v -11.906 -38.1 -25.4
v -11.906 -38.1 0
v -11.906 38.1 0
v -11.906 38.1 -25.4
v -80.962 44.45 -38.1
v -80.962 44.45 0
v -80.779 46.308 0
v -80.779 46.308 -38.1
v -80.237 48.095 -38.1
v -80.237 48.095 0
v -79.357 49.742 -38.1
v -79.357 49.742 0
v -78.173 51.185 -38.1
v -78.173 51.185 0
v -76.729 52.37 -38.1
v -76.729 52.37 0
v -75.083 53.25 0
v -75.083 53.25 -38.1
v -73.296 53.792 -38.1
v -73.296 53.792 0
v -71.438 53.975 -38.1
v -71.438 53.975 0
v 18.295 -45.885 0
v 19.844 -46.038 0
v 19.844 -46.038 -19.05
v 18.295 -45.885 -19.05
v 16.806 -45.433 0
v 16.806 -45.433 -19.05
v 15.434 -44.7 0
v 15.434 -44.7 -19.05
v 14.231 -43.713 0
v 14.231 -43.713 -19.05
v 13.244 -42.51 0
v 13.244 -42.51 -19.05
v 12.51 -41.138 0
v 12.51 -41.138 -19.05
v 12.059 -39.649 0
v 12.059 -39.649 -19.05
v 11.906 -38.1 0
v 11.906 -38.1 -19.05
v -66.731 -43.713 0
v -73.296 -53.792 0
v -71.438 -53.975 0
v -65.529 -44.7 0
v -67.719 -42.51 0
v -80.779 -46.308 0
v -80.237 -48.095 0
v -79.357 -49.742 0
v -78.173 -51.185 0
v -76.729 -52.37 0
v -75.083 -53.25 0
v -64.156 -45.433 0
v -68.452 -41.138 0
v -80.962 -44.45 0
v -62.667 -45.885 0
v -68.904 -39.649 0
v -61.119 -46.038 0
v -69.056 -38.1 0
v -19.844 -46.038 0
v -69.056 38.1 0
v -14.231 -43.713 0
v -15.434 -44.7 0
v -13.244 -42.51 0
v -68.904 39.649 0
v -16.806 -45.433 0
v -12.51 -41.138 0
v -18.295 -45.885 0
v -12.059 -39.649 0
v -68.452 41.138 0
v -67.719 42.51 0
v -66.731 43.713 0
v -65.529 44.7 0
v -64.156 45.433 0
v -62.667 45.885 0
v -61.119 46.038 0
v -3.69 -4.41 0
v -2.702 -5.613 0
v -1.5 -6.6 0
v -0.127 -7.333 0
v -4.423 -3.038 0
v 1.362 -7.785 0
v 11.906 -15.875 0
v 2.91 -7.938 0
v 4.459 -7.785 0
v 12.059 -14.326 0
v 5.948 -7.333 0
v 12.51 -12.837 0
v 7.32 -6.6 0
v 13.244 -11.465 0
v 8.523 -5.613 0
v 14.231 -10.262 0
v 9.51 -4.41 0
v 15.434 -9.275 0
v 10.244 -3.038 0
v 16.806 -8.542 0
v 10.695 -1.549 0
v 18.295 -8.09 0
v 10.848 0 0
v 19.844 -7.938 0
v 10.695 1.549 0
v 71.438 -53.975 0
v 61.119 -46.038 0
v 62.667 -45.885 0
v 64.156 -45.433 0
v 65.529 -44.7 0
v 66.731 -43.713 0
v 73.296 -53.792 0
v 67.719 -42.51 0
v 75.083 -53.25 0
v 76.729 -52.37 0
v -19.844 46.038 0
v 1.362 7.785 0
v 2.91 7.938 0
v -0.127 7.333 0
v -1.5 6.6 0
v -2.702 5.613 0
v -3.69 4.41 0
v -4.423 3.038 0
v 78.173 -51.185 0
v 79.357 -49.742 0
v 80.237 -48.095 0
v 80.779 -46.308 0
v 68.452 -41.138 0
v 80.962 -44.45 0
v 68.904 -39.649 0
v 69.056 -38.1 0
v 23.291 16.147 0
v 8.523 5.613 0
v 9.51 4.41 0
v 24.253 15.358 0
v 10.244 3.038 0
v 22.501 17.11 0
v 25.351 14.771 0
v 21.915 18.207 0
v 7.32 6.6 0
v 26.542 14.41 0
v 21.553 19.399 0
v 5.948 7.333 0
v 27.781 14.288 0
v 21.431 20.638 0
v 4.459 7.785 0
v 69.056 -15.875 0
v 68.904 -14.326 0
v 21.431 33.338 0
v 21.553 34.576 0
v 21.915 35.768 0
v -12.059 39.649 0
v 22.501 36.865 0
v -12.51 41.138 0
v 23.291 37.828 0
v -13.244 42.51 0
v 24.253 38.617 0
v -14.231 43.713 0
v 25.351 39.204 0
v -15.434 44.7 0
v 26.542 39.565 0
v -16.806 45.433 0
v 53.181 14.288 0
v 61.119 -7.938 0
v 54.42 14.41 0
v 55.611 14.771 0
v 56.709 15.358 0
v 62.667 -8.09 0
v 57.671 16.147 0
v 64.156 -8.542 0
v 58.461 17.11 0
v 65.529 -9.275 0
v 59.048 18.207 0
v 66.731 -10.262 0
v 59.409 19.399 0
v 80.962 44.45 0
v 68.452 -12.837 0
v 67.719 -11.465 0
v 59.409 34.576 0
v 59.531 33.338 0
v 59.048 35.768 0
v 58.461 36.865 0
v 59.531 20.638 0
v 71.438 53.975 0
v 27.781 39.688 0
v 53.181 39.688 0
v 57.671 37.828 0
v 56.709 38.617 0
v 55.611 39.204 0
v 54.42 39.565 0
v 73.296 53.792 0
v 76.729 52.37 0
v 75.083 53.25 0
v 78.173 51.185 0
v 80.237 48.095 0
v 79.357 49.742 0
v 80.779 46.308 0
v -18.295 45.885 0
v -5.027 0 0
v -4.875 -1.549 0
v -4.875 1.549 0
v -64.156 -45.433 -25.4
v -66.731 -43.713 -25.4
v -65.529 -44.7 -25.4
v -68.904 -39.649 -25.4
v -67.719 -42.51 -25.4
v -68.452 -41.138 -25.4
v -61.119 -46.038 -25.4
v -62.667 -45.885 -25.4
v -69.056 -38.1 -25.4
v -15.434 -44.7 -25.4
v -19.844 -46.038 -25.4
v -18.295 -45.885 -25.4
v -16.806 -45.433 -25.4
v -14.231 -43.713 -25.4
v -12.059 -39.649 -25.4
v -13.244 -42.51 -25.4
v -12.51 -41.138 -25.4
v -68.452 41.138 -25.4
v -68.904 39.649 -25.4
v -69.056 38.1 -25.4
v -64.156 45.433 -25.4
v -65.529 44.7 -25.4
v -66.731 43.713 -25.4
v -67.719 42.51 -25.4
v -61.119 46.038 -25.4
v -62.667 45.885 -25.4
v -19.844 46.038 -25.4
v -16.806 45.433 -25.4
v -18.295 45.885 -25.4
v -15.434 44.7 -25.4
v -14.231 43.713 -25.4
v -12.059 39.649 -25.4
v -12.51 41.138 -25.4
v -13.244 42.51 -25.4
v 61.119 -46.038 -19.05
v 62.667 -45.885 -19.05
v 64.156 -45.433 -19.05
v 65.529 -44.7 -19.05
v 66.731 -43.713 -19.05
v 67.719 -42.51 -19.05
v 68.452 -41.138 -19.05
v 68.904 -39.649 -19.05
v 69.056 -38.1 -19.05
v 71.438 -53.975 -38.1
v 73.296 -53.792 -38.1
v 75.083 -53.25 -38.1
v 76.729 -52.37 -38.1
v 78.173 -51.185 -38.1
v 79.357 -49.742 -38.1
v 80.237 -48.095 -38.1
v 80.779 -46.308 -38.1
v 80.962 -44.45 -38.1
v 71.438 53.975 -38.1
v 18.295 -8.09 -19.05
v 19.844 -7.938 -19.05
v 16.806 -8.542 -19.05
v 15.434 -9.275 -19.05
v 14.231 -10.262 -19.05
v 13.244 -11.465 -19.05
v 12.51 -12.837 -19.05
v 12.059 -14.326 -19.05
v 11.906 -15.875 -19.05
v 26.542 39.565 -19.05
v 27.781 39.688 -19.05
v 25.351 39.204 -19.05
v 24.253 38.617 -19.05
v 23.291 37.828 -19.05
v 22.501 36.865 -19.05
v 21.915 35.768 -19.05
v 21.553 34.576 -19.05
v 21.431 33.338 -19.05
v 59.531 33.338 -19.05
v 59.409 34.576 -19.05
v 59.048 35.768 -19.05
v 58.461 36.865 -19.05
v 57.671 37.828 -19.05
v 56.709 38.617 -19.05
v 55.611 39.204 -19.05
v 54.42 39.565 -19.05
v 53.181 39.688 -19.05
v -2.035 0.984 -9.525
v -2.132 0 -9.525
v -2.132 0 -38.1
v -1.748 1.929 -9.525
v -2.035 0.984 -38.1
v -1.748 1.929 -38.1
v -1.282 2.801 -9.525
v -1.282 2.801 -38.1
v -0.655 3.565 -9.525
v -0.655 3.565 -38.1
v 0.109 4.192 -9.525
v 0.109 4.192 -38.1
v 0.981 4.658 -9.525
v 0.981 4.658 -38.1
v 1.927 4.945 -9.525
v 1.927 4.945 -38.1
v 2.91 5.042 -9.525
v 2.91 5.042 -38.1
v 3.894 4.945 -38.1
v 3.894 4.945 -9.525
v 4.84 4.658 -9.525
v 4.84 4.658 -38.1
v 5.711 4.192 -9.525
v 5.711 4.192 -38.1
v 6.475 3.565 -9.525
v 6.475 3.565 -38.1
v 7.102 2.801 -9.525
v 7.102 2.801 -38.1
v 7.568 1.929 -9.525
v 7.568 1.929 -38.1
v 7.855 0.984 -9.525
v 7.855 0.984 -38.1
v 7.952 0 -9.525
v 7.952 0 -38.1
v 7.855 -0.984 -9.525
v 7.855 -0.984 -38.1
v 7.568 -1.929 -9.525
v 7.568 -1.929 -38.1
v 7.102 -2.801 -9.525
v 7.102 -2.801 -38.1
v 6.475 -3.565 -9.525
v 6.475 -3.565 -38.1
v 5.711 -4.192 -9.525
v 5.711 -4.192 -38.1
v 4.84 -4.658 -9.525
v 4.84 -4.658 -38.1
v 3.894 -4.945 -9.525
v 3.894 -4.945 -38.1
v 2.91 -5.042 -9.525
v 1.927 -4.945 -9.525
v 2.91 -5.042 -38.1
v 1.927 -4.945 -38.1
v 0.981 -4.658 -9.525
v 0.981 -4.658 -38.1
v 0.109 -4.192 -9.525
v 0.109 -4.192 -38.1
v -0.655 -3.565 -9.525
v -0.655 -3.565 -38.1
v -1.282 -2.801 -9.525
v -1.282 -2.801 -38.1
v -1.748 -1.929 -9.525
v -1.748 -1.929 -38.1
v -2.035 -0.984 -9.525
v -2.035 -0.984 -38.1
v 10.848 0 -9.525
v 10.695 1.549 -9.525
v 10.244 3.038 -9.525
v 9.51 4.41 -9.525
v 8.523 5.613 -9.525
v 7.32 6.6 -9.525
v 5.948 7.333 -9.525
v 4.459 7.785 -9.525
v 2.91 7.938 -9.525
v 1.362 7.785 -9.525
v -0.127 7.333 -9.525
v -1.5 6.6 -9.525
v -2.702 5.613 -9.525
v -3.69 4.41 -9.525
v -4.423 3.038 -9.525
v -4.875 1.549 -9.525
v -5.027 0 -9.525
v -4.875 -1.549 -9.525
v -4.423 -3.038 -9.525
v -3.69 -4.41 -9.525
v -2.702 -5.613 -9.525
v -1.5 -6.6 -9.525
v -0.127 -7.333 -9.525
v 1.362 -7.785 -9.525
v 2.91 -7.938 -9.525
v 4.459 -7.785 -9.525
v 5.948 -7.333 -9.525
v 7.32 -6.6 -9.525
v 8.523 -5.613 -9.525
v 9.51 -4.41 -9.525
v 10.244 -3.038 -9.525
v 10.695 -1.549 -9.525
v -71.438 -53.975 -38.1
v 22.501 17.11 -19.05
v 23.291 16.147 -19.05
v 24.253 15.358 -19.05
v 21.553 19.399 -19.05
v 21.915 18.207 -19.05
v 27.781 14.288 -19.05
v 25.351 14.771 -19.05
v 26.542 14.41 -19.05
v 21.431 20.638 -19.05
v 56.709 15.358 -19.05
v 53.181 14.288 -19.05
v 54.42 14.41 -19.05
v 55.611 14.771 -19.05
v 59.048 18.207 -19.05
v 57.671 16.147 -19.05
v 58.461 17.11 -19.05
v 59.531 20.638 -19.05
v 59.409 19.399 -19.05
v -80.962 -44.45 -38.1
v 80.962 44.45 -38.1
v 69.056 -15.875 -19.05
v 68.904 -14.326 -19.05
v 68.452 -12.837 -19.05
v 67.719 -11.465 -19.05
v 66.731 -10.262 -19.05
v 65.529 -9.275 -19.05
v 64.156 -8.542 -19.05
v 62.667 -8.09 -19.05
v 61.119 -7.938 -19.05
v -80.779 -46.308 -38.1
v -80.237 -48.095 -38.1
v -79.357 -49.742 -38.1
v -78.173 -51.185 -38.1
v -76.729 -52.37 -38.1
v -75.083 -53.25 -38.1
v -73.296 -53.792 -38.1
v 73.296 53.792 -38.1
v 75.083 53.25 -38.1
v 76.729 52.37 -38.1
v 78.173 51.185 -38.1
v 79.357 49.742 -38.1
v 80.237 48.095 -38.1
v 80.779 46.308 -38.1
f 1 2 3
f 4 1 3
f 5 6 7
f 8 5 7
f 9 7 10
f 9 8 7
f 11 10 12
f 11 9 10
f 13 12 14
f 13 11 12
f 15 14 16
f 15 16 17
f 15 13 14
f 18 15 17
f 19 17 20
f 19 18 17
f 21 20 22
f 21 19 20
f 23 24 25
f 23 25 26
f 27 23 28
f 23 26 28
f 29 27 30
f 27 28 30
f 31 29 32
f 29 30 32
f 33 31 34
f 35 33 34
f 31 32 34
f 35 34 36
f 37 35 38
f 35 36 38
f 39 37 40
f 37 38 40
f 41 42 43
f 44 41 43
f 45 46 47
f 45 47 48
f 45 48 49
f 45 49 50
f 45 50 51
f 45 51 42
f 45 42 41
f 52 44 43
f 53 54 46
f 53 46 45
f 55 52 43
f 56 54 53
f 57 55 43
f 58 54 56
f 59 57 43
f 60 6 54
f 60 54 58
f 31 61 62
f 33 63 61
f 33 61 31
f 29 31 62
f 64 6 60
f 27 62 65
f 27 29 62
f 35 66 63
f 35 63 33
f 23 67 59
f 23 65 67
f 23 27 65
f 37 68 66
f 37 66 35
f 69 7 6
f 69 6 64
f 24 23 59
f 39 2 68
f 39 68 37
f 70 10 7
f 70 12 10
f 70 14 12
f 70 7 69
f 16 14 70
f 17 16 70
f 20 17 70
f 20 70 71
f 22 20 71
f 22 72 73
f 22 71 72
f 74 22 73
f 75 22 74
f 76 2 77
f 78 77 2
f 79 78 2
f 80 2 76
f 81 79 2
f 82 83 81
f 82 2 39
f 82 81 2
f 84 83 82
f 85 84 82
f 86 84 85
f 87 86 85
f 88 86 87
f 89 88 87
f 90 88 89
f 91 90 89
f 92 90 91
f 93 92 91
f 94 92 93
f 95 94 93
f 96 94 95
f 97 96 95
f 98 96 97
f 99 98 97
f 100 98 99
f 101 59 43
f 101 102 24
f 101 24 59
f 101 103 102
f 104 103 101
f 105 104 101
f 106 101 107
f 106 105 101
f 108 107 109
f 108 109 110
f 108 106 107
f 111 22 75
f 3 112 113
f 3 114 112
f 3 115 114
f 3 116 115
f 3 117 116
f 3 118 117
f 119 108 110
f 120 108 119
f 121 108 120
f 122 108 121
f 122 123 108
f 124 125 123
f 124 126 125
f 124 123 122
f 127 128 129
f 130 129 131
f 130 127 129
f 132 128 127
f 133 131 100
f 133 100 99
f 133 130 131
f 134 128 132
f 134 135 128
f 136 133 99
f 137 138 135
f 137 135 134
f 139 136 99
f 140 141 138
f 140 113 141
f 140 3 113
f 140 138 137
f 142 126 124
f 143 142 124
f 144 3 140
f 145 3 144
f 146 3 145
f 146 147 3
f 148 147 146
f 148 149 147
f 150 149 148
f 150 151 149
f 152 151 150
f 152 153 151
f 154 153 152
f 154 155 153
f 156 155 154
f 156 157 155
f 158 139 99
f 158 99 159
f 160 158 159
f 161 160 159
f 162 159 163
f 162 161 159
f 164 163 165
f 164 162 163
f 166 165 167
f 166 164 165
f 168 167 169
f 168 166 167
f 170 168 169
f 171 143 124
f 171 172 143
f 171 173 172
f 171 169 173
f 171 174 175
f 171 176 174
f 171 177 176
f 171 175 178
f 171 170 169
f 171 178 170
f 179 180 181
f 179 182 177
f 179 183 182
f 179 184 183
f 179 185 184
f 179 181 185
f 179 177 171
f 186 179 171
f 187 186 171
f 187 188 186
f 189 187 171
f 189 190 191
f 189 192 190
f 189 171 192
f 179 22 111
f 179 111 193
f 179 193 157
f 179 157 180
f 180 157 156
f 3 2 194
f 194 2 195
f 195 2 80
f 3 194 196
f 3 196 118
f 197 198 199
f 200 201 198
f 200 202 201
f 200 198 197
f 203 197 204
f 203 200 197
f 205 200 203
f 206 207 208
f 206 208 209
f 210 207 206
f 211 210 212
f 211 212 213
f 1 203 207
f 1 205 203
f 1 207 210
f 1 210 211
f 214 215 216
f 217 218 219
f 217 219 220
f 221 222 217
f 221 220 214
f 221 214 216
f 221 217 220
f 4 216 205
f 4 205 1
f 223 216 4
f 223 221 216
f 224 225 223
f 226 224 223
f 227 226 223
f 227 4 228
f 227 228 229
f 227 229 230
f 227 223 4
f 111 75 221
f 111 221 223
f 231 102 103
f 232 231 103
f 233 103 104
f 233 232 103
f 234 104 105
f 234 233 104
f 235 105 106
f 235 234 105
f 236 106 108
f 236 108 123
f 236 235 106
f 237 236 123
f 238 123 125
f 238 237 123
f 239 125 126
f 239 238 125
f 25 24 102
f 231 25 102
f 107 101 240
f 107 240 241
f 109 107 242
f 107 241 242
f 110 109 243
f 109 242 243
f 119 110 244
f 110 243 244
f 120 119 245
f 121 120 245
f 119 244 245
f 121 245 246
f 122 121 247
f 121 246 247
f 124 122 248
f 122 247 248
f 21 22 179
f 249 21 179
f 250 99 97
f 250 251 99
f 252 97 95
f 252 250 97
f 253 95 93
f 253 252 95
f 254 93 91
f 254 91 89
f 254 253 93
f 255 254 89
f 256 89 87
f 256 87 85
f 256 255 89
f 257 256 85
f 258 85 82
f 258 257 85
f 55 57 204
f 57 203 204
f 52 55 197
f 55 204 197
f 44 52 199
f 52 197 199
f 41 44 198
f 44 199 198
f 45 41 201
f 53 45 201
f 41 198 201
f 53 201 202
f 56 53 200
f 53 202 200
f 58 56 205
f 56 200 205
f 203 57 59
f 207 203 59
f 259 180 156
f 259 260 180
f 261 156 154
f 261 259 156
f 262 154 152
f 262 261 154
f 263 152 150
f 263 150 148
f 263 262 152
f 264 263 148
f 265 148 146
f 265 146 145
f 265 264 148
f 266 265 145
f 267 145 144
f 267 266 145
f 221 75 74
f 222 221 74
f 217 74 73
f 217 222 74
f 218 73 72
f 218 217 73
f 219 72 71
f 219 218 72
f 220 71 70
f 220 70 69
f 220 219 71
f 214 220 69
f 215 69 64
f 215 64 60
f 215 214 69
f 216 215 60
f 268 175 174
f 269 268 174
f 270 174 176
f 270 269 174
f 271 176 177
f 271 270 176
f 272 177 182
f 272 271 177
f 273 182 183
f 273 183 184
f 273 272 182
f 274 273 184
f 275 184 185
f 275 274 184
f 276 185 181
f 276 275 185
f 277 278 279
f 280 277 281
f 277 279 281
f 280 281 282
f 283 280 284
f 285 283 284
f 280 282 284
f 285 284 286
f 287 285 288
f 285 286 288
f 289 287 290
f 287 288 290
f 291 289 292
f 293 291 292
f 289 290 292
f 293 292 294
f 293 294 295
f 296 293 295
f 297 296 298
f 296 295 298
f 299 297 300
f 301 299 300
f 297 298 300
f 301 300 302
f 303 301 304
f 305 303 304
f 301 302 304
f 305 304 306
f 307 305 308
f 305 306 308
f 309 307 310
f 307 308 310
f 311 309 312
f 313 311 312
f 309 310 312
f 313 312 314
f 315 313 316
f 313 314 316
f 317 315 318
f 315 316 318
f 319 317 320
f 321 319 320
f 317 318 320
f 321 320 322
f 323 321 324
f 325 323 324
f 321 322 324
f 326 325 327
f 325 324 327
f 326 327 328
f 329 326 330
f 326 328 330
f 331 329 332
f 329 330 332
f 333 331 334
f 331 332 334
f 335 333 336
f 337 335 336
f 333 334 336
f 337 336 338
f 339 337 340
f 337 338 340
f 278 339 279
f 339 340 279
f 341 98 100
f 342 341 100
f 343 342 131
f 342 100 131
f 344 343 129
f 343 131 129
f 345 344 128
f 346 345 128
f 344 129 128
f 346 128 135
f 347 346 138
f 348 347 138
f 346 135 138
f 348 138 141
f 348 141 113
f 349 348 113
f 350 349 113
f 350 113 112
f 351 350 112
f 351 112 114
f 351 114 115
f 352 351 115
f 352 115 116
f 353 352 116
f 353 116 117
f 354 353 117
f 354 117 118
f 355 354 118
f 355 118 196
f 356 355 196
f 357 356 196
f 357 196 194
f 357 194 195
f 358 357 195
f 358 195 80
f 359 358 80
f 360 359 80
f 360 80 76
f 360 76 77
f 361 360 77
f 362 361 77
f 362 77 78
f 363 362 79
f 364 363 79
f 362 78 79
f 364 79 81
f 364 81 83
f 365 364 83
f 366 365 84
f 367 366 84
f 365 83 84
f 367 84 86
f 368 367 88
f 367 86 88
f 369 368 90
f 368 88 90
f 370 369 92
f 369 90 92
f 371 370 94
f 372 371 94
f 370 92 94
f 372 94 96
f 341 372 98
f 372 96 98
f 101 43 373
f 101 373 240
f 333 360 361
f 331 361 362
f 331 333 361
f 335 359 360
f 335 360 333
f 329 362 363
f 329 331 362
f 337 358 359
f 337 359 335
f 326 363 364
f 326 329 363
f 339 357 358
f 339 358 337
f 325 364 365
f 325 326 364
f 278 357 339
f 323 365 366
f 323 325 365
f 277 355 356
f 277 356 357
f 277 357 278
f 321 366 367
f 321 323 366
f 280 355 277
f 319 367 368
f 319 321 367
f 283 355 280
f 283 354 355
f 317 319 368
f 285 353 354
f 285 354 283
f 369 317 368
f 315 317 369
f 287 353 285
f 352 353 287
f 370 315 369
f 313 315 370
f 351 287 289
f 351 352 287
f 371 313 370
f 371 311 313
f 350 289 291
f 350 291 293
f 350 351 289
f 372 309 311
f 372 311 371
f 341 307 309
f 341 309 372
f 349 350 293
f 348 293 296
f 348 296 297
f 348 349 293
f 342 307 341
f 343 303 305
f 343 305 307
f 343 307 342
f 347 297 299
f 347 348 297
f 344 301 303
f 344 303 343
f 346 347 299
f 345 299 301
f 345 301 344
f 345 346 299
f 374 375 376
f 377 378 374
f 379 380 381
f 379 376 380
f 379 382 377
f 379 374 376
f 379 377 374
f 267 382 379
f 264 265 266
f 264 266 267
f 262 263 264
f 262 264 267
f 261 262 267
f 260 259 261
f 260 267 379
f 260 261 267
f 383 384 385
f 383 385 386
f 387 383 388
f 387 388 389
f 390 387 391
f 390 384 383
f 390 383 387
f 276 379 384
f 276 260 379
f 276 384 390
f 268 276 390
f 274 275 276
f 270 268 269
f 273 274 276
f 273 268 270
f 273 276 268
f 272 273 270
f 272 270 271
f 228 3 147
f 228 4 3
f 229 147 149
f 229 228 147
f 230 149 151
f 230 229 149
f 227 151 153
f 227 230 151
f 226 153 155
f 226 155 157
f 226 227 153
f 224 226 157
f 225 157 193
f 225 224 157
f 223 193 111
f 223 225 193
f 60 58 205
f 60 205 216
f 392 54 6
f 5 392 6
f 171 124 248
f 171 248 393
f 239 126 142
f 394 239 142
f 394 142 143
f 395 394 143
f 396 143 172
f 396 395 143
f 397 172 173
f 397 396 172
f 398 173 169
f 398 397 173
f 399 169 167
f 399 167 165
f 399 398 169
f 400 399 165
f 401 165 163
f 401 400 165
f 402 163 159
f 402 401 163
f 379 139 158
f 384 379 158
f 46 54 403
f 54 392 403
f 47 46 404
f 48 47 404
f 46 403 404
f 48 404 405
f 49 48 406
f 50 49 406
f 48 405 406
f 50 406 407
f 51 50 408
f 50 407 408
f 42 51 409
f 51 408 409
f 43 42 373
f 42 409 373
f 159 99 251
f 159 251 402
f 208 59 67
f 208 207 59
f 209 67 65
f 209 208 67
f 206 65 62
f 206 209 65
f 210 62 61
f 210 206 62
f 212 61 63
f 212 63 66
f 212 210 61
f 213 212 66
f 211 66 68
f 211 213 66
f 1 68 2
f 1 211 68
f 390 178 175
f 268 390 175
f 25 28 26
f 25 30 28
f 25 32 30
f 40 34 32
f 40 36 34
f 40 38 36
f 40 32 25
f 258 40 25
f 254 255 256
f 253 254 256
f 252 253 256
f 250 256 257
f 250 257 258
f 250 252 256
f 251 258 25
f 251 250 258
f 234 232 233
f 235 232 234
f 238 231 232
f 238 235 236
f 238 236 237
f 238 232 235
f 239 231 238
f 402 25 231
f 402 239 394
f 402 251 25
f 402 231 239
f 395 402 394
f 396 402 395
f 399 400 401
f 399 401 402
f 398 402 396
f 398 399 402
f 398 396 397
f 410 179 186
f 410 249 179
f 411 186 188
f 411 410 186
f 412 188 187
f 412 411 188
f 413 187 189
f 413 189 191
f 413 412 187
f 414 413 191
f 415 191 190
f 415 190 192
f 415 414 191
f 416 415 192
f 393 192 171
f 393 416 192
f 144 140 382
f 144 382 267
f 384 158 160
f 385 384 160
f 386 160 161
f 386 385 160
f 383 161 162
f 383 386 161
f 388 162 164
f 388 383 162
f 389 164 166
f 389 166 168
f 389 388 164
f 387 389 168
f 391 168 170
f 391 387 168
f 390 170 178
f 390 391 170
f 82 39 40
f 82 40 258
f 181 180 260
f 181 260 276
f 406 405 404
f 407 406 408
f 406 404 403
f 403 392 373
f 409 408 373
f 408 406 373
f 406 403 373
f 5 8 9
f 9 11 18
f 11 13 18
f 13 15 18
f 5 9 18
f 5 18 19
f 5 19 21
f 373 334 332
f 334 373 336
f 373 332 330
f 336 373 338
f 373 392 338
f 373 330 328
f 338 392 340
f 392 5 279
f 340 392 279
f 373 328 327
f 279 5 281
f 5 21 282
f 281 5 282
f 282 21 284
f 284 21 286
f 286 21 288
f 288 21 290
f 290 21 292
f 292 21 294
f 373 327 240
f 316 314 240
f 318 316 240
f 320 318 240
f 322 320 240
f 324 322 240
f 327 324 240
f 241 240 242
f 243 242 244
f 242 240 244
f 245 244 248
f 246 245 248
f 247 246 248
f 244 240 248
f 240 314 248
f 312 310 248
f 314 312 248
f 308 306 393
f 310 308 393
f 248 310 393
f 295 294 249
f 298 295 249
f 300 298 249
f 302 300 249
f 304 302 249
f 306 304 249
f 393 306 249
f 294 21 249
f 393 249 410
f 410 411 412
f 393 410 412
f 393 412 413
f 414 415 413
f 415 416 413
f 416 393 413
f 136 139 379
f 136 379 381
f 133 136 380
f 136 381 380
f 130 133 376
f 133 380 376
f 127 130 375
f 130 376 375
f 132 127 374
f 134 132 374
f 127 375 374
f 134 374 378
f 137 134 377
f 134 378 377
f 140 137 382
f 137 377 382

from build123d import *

# Parameters (mm, degrees)
SKETCH1_W                                        = 161.925
SKETCH1_H                                        = 107.95
BOSS_EXTRUDE1_DEPTH                              = 38.1
SKETCH2_W                                        = 57.15
SKETCH2_H                                        = 92.075
CUT_EXTRUDE1_DEPTH                               = 25.4
FILLET1_R                                        = 7.9375
SKETCH3_W                                        = 57.15
SKETCH3_H                                        = 38.1
SKETCH3_W_2                                      = 38.1
SKETCH3_H_2                                      = 25.4
CUT_EXTRUDE2_DEPTH                               = 19.05
FILLET2_R                                        = 6.35
FILLET3_R                                        = 7.9375
FILLET4_R                                        = 9.525
CBORE_FOR_3_8_SOCKET_HEAD_CAP_SCREW1_D           = 10.0838
CBORE_FOR_3_8_SOCKET_HEAD_CAP_SCREW1_CBORE_D     = 15.875
CBORE_FOR_3_8_SOCKET_HEAD_CAP_SCREW1_CBORE_DEPTH = 9.525


with BuildPart() as part:
    # Sketch1 → Boss-Extrude1 (new body)
    with BuildSketch(Plane.XY):
        Rectangle(SKETCH1_W, SKETCH1_H)
    extrude(amount=-BOSS_EXTRUDE1_DEPTH)

    # Sketch2 → Cut-Extrude1 (cut)
    with BuildSketch(Plane.XY):
        with Locations((-40.48125, 0)):
            Rectangle(SKETCH2_W, SKETCH2_H)
    extrude(amount=-CUT_EXTRUDE1_DEPTH, mode=Mode.SUBTRACT)

    # Fillet1
    fillet1_edges = [part.edges().sort_by_distance(p)[0] for p in [
        (-11.90625, 46.0375, -12.7),
        (-11.90625, -46.0375, -12.7),
        (-69.05625, -46.0375, -12.7),
        (-69.05625, 46.0375, -12.7),
    ]]
    fillet(fillet1_edges, radius=FILLET1_R)

    # Sketch3 → Cut-Extrude2 (cut)
    with BuildSketch(Plane.XY):
        with Locations((40.48125, -26.9875)):
            Rectangle(SKETCH3_W, SKETCH3_H)
        with Locations((40.48125, 26.9875)):
            Rectangle(SKETCH3_W_2, SKETCH3_H_2)
    extrude(amount=-CUT_EXTRUDE2_DEPTH, mode=Mode.SUBTRACT)

    # Fillet2
    fillet2_edges = [part.edges().sort_by_distance(p)[0] for p in [
        (59.53125, 39.6875, -9.525),
        (59.53125, 14.2875, -9.525),
        (21.43125, 14.2875, -9.525),
        (21.43125, 39.6875, -9.525),
    ]]
    fillet(fillet2_edges, radius=FILLET2_R)

    # Fillet3
    fillet3_edges = [part.edges().sort_by_distance(p)[0] for p in [
        (69.05625, -7.9375, -9.525),
        (69.05625, -46.0375, -9.525),
        (11.90625, -46.0375, -9.525),
        (11.90625, -7.9375, -9.525),
    ]]
    fillet(fillet3_edges, radius=FILLET3_R)

    # Fillet4
    fillet4_edges = [part.edges().sort_by_distance(p)[0] for p in [
        (80.9625, -53.975, -19.05),
        (-80.9625, -53.975, -19.05),
        (-80.9625, 53.975, -19.05),
        (80.9625, 53.975, -19.05),
    ]]
    fillet(fillet4_edges, radius=FILLET4_R)

    # CBORE for 3/8 Socket Head Cap Screw1 (through all)
    with Locations(Plane.XY):
        with Locations((2.910260727, 0)):
            CounterBoreHole(CBORE_FOR_3_8_SOCKET_HEAD_CAP_SCREW1_D / 2, CBORE_FOR_3_8_SOCKET_HEAD_CAP_SCREW1_CBORE_D / 2, CBORE_FOR_3_8_SOCKET_HEAD_CAP_SCREW1_CBORE_DEPTH)


solid = part.part
